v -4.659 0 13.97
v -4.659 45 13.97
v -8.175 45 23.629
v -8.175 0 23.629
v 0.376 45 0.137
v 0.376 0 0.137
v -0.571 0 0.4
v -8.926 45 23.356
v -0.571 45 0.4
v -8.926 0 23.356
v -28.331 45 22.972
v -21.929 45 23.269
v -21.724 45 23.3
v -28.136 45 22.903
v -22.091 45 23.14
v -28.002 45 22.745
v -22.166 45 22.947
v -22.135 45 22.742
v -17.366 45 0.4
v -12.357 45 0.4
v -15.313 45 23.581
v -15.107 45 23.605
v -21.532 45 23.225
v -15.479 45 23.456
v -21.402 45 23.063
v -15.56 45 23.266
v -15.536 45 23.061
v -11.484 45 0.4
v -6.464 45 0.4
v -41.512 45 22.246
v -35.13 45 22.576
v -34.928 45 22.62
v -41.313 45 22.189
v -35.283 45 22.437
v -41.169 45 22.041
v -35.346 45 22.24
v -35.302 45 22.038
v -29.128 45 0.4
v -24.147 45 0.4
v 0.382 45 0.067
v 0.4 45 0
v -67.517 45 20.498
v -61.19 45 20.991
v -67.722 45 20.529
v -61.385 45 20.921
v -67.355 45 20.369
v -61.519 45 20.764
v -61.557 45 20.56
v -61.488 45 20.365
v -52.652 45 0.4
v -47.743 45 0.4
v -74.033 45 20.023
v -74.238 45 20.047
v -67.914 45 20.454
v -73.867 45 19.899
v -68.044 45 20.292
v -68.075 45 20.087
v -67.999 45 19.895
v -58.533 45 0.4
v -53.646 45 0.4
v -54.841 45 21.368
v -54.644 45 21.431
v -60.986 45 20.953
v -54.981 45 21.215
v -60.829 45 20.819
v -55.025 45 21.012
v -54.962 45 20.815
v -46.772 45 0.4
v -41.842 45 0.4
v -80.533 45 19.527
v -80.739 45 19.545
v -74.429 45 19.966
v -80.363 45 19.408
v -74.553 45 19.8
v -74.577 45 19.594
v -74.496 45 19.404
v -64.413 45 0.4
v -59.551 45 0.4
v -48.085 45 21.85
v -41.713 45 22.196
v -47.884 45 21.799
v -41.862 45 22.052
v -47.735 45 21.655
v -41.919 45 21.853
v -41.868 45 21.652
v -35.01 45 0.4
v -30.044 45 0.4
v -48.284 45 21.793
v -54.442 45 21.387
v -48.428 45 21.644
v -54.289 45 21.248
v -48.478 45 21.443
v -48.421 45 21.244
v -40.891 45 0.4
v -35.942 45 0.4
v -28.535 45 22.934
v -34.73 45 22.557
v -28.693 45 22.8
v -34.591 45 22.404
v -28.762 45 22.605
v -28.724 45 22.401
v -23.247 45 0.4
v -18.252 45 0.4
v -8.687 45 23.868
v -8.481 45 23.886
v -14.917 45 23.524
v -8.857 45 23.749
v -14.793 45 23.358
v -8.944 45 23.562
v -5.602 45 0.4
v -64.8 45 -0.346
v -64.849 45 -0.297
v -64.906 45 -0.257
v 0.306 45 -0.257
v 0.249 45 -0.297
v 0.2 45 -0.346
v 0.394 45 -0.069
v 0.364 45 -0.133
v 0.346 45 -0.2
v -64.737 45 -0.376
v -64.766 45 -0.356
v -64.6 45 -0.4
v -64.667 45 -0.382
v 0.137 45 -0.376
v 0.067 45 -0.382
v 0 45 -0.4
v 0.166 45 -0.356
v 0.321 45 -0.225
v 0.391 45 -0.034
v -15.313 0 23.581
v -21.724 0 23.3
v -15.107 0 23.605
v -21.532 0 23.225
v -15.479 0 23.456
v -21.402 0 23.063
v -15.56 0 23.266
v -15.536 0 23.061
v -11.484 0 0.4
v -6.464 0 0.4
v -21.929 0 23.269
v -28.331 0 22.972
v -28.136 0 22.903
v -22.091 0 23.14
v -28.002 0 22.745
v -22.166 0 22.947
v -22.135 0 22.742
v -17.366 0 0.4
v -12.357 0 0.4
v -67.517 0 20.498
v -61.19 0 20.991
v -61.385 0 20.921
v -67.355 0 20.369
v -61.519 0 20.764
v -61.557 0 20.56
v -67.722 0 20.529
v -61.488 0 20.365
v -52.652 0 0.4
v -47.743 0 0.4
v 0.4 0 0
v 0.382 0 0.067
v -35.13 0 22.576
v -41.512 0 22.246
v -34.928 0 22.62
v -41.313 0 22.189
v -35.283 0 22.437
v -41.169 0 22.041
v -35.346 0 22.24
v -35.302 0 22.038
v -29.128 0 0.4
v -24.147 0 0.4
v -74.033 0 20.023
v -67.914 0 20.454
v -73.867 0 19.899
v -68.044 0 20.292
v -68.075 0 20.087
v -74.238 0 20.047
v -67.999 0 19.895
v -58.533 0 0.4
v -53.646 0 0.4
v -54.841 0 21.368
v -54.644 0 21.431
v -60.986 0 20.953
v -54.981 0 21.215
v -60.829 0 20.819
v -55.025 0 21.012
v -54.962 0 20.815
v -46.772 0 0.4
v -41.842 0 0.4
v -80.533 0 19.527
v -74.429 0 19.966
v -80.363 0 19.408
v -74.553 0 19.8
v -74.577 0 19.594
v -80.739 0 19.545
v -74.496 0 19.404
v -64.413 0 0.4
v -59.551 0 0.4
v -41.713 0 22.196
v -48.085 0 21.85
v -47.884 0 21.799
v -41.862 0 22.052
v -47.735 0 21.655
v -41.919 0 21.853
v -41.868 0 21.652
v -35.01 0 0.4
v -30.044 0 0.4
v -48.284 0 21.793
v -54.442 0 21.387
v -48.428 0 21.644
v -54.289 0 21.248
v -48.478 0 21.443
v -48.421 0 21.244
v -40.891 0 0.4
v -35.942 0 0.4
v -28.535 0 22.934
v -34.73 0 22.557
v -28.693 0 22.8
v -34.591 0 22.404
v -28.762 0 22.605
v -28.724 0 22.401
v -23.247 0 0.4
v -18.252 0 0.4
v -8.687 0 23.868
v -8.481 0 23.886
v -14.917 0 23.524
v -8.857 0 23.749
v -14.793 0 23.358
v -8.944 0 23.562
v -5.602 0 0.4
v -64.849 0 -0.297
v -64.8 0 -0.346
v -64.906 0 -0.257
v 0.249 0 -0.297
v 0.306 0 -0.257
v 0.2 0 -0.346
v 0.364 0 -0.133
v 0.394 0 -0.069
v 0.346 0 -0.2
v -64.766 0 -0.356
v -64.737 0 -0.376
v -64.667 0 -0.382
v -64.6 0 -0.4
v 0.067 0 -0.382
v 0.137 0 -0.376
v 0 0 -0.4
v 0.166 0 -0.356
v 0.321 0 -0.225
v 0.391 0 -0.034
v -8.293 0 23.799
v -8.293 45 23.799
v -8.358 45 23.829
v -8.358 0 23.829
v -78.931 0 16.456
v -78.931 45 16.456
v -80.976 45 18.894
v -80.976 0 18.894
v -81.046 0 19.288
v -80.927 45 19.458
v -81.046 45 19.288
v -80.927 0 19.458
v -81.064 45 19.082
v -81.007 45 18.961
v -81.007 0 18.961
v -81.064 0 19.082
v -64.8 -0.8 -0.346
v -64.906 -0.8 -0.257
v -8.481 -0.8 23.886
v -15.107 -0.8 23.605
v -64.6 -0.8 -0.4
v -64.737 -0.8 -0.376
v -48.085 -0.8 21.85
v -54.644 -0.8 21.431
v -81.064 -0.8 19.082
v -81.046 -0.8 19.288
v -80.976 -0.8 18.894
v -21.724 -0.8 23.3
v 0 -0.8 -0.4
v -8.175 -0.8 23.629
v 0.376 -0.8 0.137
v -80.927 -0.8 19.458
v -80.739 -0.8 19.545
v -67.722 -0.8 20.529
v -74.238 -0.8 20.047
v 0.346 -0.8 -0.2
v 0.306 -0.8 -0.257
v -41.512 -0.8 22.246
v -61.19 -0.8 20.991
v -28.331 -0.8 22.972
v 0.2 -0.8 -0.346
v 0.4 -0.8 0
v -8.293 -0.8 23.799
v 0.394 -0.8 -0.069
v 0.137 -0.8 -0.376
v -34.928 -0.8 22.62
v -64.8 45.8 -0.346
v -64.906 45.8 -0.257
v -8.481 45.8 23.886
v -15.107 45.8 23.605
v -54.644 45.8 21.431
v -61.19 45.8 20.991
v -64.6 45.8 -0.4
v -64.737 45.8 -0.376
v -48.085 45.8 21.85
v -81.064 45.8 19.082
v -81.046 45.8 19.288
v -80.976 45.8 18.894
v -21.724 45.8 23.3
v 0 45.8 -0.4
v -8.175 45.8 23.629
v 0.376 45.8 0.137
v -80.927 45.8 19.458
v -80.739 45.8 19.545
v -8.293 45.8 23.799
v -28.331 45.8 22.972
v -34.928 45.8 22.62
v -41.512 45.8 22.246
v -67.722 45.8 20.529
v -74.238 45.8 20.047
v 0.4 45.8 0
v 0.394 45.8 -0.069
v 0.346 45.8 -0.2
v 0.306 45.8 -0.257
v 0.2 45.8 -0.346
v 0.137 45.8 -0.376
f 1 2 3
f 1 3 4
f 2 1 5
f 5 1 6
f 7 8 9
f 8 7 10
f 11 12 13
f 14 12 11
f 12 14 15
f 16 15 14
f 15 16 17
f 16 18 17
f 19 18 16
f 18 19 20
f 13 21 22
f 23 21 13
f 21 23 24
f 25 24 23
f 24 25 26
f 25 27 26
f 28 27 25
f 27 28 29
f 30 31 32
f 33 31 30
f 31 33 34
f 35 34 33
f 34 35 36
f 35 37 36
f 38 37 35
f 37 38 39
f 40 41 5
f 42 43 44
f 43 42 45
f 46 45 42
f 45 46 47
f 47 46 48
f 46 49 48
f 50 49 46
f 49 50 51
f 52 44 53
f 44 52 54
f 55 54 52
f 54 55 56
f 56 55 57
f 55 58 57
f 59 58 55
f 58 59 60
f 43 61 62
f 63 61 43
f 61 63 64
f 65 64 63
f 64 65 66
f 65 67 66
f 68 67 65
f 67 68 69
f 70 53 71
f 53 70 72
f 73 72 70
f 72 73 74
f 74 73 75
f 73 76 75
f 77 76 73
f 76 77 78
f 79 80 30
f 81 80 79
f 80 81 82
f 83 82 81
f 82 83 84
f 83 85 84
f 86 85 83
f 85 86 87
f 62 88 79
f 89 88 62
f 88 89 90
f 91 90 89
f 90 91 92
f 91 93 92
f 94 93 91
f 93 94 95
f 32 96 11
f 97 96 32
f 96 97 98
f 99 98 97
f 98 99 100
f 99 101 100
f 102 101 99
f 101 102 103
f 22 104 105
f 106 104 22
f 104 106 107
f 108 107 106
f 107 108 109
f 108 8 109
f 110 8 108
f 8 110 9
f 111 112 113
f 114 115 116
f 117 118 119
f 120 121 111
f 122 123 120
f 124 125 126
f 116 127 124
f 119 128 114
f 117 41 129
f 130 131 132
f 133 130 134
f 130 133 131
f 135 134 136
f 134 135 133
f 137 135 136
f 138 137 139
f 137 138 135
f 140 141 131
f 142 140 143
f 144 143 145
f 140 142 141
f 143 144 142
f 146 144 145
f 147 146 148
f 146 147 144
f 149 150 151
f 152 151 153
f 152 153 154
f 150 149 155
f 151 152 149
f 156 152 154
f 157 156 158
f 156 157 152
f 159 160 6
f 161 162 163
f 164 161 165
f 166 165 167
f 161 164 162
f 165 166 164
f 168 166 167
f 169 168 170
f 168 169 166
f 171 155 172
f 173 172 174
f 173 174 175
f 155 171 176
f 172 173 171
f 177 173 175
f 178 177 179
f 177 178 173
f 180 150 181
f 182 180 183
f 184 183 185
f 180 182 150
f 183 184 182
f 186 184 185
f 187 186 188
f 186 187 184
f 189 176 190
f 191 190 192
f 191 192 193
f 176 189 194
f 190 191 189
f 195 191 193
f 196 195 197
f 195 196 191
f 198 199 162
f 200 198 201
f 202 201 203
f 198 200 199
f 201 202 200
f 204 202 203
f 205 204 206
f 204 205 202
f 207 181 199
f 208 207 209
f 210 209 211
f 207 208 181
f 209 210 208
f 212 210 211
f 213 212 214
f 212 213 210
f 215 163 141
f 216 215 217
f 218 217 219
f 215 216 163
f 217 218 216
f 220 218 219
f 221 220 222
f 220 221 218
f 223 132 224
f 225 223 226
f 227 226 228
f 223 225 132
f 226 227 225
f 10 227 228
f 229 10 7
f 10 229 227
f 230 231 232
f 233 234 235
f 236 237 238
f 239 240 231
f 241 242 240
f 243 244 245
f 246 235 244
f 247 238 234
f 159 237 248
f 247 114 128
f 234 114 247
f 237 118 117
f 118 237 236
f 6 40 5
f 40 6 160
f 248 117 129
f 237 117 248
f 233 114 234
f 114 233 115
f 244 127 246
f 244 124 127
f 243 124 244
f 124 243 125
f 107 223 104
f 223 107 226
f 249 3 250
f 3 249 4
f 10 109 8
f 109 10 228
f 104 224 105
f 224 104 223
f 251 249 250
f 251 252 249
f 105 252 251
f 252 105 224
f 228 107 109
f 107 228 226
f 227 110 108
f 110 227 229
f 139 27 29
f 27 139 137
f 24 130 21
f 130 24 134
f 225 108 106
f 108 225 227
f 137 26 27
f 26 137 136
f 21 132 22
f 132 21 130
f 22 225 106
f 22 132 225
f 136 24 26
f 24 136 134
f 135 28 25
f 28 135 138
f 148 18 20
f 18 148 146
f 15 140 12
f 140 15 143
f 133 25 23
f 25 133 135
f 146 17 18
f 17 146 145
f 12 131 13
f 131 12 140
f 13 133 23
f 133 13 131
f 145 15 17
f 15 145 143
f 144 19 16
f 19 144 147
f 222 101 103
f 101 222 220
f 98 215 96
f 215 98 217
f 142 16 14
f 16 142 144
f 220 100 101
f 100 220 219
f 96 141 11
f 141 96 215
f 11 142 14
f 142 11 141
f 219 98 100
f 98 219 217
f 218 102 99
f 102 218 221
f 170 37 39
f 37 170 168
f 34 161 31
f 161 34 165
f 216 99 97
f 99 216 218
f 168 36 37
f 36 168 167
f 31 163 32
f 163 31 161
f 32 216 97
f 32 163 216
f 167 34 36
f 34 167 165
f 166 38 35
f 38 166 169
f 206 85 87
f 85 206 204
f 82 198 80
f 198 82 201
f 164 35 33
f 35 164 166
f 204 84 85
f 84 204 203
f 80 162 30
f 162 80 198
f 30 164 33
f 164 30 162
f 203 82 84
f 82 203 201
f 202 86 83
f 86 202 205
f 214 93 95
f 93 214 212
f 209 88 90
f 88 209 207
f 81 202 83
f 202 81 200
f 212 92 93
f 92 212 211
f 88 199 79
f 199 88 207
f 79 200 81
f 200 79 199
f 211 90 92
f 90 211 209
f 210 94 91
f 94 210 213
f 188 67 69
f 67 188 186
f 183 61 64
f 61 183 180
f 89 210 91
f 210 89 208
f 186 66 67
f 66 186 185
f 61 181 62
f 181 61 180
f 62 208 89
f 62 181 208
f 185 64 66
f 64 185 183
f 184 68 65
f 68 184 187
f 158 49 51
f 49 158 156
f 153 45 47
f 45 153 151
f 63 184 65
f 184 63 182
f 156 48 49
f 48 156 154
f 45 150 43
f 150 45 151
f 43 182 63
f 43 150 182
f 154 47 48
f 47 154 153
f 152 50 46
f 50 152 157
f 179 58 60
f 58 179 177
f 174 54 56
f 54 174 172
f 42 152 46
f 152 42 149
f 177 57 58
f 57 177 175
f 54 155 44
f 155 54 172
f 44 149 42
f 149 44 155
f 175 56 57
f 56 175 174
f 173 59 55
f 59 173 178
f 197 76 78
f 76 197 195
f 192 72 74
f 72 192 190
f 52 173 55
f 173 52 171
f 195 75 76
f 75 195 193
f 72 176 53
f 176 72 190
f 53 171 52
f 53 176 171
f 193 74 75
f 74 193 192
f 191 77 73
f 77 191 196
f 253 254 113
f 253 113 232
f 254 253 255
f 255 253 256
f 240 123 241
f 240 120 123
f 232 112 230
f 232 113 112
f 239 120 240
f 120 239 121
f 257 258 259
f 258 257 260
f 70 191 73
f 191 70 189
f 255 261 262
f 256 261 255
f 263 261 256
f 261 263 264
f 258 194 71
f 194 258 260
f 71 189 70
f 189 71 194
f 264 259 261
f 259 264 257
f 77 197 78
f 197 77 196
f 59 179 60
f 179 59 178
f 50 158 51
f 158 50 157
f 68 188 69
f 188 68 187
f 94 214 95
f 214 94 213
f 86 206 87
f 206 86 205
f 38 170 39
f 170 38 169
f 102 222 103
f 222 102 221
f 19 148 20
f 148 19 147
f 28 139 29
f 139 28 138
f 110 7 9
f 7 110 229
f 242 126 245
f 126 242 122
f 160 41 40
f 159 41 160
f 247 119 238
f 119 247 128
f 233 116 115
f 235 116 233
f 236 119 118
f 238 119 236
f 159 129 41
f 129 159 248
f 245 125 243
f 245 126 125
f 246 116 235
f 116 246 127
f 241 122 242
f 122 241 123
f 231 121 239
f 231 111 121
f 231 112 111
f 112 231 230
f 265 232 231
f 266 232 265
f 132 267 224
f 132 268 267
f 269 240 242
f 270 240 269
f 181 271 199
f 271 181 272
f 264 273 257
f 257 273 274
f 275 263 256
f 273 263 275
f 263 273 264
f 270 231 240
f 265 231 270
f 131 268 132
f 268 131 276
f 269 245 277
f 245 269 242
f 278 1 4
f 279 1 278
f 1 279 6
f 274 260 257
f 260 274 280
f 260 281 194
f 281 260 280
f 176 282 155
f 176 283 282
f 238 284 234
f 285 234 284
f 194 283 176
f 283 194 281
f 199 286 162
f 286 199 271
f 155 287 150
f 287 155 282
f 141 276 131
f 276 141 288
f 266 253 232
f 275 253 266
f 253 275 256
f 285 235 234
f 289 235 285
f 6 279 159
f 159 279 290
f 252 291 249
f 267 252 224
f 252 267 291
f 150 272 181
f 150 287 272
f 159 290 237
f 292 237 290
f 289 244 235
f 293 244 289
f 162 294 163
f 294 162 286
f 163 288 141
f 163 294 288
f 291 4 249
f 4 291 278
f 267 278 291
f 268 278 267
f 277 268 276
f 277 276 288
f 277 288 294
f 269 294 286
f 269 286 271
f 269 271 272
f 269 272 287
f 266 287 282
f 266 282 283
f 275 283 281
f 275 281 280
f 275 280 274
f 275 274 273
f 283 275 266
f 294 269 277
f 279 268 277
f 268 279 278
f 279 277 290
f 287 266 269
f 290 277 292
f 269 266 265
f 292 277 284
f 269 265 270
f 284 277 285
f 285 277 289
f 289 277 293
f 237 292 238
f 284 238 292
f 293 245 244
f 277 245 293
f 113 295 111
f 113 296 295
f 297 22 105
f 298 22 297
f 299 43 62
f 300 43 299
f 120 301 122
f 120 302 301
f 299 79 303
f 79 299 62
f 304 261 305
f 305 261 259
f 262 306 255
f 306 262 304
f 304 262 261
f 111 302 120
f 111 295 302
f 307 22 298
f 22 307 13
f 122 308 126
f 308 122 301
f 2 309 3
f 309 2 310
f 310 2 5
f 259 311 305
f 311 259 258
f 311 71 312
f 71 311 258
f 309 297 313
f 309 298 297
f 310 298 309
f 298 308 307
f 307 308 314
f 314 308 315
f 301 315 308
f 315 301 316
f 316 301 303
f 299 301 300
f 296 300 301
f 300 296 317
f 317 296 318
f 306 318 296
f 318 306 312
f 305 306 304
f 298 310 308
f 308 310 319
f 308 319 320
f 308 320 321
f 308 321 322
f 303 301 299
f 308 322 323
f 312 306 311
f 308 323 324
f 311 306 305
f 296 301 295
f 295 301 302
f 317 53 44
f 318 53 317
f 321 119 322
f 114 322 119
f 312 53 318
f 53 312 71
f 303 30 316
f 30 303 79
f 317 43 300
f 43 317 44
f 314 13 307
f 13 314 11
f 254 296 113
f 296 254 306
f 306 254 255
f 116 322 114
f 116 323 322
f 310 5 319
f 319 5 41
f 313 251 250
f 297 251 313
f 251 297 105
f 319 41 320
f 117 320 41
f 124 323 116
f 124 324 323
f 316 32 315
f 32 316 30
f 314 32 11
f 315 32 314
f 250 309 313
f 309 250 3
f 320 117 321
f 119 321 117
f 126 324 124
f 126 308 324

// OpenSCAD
/* [Card Dimensions] */
//Card Height
ch=25;
//Card Width
cw=45;
//Stack Thickness
st=5;
//Card Pack count
cp=11;

/* [Side Angles] */
//Start Angle
sa=20;
//End Angle
ea=40;

/* [Print Tweakables] */
//Nozzle thickness
n=0.4;
//Layers
l=2;
//Circle Roundness
$fn=12;

/* [Debugging] */
// Show Sides (Disable for fast render)
showSides=true;

cardHolder();

module cardHolder(){
    dividers(side=0);
    if (showSides==true){
        hull(){dividers(side=1);}
        hull(){dividers(side=2);}
    }
}

module dividers(side=0){
    dt=n*l;//divider thickness;
    tl=(st*cp)+(dt*(cp+1));//Total Length
    fl=tl/cp;//fractional length
    ta=-sa+ea;//Total Angle;
    fa=ta/cp;//fractional angle;
    for (i=[0:cp]){
        //Divider
        translate([-i*fl,0,0])rotate([0,-sa-(fa*i),0]){
        translate([-(n*l)/2,0,0]){
            roundedCube(n*l,cw,ch,side=side);}//Divider
        }
    }
    //Bottom plate
    translate([0,0,-(n*l)/2])rotate([0,-90,0])roundedCube(n*l,cw,tl,side=side);
}

module roundedCube(x,y,z,side=0){
    if (side==0){
        cube([x,y,z]);
        translate([x/2,0,0])rotate([-90,0,0])cylinder(h=y,r=x/2);//Round top
        translate([x/2,0,z])rotate([-90,0,0])cylinder(h=y,r=x/2);//Round top
    }
    if (side==1){
        translate([x/2,-n*l,0])rotate([-90,0,0])cylinder(h=n*l,r=x/2);//Round top
        translate([x/2,-n*l,z])rotate([-90,0,0])cylinder(h=n*l,r=x/2);//Round top
    }
    if (side==2){
        translate([x/2,y,0])rotate([-90,0,0])cylinder(h=n*l,r=x/2);//Round top
        translate([x/2,y,z])rotate([-90,0,0])cylinder(h=n*l,r=x/2);//Round top
    }
}
